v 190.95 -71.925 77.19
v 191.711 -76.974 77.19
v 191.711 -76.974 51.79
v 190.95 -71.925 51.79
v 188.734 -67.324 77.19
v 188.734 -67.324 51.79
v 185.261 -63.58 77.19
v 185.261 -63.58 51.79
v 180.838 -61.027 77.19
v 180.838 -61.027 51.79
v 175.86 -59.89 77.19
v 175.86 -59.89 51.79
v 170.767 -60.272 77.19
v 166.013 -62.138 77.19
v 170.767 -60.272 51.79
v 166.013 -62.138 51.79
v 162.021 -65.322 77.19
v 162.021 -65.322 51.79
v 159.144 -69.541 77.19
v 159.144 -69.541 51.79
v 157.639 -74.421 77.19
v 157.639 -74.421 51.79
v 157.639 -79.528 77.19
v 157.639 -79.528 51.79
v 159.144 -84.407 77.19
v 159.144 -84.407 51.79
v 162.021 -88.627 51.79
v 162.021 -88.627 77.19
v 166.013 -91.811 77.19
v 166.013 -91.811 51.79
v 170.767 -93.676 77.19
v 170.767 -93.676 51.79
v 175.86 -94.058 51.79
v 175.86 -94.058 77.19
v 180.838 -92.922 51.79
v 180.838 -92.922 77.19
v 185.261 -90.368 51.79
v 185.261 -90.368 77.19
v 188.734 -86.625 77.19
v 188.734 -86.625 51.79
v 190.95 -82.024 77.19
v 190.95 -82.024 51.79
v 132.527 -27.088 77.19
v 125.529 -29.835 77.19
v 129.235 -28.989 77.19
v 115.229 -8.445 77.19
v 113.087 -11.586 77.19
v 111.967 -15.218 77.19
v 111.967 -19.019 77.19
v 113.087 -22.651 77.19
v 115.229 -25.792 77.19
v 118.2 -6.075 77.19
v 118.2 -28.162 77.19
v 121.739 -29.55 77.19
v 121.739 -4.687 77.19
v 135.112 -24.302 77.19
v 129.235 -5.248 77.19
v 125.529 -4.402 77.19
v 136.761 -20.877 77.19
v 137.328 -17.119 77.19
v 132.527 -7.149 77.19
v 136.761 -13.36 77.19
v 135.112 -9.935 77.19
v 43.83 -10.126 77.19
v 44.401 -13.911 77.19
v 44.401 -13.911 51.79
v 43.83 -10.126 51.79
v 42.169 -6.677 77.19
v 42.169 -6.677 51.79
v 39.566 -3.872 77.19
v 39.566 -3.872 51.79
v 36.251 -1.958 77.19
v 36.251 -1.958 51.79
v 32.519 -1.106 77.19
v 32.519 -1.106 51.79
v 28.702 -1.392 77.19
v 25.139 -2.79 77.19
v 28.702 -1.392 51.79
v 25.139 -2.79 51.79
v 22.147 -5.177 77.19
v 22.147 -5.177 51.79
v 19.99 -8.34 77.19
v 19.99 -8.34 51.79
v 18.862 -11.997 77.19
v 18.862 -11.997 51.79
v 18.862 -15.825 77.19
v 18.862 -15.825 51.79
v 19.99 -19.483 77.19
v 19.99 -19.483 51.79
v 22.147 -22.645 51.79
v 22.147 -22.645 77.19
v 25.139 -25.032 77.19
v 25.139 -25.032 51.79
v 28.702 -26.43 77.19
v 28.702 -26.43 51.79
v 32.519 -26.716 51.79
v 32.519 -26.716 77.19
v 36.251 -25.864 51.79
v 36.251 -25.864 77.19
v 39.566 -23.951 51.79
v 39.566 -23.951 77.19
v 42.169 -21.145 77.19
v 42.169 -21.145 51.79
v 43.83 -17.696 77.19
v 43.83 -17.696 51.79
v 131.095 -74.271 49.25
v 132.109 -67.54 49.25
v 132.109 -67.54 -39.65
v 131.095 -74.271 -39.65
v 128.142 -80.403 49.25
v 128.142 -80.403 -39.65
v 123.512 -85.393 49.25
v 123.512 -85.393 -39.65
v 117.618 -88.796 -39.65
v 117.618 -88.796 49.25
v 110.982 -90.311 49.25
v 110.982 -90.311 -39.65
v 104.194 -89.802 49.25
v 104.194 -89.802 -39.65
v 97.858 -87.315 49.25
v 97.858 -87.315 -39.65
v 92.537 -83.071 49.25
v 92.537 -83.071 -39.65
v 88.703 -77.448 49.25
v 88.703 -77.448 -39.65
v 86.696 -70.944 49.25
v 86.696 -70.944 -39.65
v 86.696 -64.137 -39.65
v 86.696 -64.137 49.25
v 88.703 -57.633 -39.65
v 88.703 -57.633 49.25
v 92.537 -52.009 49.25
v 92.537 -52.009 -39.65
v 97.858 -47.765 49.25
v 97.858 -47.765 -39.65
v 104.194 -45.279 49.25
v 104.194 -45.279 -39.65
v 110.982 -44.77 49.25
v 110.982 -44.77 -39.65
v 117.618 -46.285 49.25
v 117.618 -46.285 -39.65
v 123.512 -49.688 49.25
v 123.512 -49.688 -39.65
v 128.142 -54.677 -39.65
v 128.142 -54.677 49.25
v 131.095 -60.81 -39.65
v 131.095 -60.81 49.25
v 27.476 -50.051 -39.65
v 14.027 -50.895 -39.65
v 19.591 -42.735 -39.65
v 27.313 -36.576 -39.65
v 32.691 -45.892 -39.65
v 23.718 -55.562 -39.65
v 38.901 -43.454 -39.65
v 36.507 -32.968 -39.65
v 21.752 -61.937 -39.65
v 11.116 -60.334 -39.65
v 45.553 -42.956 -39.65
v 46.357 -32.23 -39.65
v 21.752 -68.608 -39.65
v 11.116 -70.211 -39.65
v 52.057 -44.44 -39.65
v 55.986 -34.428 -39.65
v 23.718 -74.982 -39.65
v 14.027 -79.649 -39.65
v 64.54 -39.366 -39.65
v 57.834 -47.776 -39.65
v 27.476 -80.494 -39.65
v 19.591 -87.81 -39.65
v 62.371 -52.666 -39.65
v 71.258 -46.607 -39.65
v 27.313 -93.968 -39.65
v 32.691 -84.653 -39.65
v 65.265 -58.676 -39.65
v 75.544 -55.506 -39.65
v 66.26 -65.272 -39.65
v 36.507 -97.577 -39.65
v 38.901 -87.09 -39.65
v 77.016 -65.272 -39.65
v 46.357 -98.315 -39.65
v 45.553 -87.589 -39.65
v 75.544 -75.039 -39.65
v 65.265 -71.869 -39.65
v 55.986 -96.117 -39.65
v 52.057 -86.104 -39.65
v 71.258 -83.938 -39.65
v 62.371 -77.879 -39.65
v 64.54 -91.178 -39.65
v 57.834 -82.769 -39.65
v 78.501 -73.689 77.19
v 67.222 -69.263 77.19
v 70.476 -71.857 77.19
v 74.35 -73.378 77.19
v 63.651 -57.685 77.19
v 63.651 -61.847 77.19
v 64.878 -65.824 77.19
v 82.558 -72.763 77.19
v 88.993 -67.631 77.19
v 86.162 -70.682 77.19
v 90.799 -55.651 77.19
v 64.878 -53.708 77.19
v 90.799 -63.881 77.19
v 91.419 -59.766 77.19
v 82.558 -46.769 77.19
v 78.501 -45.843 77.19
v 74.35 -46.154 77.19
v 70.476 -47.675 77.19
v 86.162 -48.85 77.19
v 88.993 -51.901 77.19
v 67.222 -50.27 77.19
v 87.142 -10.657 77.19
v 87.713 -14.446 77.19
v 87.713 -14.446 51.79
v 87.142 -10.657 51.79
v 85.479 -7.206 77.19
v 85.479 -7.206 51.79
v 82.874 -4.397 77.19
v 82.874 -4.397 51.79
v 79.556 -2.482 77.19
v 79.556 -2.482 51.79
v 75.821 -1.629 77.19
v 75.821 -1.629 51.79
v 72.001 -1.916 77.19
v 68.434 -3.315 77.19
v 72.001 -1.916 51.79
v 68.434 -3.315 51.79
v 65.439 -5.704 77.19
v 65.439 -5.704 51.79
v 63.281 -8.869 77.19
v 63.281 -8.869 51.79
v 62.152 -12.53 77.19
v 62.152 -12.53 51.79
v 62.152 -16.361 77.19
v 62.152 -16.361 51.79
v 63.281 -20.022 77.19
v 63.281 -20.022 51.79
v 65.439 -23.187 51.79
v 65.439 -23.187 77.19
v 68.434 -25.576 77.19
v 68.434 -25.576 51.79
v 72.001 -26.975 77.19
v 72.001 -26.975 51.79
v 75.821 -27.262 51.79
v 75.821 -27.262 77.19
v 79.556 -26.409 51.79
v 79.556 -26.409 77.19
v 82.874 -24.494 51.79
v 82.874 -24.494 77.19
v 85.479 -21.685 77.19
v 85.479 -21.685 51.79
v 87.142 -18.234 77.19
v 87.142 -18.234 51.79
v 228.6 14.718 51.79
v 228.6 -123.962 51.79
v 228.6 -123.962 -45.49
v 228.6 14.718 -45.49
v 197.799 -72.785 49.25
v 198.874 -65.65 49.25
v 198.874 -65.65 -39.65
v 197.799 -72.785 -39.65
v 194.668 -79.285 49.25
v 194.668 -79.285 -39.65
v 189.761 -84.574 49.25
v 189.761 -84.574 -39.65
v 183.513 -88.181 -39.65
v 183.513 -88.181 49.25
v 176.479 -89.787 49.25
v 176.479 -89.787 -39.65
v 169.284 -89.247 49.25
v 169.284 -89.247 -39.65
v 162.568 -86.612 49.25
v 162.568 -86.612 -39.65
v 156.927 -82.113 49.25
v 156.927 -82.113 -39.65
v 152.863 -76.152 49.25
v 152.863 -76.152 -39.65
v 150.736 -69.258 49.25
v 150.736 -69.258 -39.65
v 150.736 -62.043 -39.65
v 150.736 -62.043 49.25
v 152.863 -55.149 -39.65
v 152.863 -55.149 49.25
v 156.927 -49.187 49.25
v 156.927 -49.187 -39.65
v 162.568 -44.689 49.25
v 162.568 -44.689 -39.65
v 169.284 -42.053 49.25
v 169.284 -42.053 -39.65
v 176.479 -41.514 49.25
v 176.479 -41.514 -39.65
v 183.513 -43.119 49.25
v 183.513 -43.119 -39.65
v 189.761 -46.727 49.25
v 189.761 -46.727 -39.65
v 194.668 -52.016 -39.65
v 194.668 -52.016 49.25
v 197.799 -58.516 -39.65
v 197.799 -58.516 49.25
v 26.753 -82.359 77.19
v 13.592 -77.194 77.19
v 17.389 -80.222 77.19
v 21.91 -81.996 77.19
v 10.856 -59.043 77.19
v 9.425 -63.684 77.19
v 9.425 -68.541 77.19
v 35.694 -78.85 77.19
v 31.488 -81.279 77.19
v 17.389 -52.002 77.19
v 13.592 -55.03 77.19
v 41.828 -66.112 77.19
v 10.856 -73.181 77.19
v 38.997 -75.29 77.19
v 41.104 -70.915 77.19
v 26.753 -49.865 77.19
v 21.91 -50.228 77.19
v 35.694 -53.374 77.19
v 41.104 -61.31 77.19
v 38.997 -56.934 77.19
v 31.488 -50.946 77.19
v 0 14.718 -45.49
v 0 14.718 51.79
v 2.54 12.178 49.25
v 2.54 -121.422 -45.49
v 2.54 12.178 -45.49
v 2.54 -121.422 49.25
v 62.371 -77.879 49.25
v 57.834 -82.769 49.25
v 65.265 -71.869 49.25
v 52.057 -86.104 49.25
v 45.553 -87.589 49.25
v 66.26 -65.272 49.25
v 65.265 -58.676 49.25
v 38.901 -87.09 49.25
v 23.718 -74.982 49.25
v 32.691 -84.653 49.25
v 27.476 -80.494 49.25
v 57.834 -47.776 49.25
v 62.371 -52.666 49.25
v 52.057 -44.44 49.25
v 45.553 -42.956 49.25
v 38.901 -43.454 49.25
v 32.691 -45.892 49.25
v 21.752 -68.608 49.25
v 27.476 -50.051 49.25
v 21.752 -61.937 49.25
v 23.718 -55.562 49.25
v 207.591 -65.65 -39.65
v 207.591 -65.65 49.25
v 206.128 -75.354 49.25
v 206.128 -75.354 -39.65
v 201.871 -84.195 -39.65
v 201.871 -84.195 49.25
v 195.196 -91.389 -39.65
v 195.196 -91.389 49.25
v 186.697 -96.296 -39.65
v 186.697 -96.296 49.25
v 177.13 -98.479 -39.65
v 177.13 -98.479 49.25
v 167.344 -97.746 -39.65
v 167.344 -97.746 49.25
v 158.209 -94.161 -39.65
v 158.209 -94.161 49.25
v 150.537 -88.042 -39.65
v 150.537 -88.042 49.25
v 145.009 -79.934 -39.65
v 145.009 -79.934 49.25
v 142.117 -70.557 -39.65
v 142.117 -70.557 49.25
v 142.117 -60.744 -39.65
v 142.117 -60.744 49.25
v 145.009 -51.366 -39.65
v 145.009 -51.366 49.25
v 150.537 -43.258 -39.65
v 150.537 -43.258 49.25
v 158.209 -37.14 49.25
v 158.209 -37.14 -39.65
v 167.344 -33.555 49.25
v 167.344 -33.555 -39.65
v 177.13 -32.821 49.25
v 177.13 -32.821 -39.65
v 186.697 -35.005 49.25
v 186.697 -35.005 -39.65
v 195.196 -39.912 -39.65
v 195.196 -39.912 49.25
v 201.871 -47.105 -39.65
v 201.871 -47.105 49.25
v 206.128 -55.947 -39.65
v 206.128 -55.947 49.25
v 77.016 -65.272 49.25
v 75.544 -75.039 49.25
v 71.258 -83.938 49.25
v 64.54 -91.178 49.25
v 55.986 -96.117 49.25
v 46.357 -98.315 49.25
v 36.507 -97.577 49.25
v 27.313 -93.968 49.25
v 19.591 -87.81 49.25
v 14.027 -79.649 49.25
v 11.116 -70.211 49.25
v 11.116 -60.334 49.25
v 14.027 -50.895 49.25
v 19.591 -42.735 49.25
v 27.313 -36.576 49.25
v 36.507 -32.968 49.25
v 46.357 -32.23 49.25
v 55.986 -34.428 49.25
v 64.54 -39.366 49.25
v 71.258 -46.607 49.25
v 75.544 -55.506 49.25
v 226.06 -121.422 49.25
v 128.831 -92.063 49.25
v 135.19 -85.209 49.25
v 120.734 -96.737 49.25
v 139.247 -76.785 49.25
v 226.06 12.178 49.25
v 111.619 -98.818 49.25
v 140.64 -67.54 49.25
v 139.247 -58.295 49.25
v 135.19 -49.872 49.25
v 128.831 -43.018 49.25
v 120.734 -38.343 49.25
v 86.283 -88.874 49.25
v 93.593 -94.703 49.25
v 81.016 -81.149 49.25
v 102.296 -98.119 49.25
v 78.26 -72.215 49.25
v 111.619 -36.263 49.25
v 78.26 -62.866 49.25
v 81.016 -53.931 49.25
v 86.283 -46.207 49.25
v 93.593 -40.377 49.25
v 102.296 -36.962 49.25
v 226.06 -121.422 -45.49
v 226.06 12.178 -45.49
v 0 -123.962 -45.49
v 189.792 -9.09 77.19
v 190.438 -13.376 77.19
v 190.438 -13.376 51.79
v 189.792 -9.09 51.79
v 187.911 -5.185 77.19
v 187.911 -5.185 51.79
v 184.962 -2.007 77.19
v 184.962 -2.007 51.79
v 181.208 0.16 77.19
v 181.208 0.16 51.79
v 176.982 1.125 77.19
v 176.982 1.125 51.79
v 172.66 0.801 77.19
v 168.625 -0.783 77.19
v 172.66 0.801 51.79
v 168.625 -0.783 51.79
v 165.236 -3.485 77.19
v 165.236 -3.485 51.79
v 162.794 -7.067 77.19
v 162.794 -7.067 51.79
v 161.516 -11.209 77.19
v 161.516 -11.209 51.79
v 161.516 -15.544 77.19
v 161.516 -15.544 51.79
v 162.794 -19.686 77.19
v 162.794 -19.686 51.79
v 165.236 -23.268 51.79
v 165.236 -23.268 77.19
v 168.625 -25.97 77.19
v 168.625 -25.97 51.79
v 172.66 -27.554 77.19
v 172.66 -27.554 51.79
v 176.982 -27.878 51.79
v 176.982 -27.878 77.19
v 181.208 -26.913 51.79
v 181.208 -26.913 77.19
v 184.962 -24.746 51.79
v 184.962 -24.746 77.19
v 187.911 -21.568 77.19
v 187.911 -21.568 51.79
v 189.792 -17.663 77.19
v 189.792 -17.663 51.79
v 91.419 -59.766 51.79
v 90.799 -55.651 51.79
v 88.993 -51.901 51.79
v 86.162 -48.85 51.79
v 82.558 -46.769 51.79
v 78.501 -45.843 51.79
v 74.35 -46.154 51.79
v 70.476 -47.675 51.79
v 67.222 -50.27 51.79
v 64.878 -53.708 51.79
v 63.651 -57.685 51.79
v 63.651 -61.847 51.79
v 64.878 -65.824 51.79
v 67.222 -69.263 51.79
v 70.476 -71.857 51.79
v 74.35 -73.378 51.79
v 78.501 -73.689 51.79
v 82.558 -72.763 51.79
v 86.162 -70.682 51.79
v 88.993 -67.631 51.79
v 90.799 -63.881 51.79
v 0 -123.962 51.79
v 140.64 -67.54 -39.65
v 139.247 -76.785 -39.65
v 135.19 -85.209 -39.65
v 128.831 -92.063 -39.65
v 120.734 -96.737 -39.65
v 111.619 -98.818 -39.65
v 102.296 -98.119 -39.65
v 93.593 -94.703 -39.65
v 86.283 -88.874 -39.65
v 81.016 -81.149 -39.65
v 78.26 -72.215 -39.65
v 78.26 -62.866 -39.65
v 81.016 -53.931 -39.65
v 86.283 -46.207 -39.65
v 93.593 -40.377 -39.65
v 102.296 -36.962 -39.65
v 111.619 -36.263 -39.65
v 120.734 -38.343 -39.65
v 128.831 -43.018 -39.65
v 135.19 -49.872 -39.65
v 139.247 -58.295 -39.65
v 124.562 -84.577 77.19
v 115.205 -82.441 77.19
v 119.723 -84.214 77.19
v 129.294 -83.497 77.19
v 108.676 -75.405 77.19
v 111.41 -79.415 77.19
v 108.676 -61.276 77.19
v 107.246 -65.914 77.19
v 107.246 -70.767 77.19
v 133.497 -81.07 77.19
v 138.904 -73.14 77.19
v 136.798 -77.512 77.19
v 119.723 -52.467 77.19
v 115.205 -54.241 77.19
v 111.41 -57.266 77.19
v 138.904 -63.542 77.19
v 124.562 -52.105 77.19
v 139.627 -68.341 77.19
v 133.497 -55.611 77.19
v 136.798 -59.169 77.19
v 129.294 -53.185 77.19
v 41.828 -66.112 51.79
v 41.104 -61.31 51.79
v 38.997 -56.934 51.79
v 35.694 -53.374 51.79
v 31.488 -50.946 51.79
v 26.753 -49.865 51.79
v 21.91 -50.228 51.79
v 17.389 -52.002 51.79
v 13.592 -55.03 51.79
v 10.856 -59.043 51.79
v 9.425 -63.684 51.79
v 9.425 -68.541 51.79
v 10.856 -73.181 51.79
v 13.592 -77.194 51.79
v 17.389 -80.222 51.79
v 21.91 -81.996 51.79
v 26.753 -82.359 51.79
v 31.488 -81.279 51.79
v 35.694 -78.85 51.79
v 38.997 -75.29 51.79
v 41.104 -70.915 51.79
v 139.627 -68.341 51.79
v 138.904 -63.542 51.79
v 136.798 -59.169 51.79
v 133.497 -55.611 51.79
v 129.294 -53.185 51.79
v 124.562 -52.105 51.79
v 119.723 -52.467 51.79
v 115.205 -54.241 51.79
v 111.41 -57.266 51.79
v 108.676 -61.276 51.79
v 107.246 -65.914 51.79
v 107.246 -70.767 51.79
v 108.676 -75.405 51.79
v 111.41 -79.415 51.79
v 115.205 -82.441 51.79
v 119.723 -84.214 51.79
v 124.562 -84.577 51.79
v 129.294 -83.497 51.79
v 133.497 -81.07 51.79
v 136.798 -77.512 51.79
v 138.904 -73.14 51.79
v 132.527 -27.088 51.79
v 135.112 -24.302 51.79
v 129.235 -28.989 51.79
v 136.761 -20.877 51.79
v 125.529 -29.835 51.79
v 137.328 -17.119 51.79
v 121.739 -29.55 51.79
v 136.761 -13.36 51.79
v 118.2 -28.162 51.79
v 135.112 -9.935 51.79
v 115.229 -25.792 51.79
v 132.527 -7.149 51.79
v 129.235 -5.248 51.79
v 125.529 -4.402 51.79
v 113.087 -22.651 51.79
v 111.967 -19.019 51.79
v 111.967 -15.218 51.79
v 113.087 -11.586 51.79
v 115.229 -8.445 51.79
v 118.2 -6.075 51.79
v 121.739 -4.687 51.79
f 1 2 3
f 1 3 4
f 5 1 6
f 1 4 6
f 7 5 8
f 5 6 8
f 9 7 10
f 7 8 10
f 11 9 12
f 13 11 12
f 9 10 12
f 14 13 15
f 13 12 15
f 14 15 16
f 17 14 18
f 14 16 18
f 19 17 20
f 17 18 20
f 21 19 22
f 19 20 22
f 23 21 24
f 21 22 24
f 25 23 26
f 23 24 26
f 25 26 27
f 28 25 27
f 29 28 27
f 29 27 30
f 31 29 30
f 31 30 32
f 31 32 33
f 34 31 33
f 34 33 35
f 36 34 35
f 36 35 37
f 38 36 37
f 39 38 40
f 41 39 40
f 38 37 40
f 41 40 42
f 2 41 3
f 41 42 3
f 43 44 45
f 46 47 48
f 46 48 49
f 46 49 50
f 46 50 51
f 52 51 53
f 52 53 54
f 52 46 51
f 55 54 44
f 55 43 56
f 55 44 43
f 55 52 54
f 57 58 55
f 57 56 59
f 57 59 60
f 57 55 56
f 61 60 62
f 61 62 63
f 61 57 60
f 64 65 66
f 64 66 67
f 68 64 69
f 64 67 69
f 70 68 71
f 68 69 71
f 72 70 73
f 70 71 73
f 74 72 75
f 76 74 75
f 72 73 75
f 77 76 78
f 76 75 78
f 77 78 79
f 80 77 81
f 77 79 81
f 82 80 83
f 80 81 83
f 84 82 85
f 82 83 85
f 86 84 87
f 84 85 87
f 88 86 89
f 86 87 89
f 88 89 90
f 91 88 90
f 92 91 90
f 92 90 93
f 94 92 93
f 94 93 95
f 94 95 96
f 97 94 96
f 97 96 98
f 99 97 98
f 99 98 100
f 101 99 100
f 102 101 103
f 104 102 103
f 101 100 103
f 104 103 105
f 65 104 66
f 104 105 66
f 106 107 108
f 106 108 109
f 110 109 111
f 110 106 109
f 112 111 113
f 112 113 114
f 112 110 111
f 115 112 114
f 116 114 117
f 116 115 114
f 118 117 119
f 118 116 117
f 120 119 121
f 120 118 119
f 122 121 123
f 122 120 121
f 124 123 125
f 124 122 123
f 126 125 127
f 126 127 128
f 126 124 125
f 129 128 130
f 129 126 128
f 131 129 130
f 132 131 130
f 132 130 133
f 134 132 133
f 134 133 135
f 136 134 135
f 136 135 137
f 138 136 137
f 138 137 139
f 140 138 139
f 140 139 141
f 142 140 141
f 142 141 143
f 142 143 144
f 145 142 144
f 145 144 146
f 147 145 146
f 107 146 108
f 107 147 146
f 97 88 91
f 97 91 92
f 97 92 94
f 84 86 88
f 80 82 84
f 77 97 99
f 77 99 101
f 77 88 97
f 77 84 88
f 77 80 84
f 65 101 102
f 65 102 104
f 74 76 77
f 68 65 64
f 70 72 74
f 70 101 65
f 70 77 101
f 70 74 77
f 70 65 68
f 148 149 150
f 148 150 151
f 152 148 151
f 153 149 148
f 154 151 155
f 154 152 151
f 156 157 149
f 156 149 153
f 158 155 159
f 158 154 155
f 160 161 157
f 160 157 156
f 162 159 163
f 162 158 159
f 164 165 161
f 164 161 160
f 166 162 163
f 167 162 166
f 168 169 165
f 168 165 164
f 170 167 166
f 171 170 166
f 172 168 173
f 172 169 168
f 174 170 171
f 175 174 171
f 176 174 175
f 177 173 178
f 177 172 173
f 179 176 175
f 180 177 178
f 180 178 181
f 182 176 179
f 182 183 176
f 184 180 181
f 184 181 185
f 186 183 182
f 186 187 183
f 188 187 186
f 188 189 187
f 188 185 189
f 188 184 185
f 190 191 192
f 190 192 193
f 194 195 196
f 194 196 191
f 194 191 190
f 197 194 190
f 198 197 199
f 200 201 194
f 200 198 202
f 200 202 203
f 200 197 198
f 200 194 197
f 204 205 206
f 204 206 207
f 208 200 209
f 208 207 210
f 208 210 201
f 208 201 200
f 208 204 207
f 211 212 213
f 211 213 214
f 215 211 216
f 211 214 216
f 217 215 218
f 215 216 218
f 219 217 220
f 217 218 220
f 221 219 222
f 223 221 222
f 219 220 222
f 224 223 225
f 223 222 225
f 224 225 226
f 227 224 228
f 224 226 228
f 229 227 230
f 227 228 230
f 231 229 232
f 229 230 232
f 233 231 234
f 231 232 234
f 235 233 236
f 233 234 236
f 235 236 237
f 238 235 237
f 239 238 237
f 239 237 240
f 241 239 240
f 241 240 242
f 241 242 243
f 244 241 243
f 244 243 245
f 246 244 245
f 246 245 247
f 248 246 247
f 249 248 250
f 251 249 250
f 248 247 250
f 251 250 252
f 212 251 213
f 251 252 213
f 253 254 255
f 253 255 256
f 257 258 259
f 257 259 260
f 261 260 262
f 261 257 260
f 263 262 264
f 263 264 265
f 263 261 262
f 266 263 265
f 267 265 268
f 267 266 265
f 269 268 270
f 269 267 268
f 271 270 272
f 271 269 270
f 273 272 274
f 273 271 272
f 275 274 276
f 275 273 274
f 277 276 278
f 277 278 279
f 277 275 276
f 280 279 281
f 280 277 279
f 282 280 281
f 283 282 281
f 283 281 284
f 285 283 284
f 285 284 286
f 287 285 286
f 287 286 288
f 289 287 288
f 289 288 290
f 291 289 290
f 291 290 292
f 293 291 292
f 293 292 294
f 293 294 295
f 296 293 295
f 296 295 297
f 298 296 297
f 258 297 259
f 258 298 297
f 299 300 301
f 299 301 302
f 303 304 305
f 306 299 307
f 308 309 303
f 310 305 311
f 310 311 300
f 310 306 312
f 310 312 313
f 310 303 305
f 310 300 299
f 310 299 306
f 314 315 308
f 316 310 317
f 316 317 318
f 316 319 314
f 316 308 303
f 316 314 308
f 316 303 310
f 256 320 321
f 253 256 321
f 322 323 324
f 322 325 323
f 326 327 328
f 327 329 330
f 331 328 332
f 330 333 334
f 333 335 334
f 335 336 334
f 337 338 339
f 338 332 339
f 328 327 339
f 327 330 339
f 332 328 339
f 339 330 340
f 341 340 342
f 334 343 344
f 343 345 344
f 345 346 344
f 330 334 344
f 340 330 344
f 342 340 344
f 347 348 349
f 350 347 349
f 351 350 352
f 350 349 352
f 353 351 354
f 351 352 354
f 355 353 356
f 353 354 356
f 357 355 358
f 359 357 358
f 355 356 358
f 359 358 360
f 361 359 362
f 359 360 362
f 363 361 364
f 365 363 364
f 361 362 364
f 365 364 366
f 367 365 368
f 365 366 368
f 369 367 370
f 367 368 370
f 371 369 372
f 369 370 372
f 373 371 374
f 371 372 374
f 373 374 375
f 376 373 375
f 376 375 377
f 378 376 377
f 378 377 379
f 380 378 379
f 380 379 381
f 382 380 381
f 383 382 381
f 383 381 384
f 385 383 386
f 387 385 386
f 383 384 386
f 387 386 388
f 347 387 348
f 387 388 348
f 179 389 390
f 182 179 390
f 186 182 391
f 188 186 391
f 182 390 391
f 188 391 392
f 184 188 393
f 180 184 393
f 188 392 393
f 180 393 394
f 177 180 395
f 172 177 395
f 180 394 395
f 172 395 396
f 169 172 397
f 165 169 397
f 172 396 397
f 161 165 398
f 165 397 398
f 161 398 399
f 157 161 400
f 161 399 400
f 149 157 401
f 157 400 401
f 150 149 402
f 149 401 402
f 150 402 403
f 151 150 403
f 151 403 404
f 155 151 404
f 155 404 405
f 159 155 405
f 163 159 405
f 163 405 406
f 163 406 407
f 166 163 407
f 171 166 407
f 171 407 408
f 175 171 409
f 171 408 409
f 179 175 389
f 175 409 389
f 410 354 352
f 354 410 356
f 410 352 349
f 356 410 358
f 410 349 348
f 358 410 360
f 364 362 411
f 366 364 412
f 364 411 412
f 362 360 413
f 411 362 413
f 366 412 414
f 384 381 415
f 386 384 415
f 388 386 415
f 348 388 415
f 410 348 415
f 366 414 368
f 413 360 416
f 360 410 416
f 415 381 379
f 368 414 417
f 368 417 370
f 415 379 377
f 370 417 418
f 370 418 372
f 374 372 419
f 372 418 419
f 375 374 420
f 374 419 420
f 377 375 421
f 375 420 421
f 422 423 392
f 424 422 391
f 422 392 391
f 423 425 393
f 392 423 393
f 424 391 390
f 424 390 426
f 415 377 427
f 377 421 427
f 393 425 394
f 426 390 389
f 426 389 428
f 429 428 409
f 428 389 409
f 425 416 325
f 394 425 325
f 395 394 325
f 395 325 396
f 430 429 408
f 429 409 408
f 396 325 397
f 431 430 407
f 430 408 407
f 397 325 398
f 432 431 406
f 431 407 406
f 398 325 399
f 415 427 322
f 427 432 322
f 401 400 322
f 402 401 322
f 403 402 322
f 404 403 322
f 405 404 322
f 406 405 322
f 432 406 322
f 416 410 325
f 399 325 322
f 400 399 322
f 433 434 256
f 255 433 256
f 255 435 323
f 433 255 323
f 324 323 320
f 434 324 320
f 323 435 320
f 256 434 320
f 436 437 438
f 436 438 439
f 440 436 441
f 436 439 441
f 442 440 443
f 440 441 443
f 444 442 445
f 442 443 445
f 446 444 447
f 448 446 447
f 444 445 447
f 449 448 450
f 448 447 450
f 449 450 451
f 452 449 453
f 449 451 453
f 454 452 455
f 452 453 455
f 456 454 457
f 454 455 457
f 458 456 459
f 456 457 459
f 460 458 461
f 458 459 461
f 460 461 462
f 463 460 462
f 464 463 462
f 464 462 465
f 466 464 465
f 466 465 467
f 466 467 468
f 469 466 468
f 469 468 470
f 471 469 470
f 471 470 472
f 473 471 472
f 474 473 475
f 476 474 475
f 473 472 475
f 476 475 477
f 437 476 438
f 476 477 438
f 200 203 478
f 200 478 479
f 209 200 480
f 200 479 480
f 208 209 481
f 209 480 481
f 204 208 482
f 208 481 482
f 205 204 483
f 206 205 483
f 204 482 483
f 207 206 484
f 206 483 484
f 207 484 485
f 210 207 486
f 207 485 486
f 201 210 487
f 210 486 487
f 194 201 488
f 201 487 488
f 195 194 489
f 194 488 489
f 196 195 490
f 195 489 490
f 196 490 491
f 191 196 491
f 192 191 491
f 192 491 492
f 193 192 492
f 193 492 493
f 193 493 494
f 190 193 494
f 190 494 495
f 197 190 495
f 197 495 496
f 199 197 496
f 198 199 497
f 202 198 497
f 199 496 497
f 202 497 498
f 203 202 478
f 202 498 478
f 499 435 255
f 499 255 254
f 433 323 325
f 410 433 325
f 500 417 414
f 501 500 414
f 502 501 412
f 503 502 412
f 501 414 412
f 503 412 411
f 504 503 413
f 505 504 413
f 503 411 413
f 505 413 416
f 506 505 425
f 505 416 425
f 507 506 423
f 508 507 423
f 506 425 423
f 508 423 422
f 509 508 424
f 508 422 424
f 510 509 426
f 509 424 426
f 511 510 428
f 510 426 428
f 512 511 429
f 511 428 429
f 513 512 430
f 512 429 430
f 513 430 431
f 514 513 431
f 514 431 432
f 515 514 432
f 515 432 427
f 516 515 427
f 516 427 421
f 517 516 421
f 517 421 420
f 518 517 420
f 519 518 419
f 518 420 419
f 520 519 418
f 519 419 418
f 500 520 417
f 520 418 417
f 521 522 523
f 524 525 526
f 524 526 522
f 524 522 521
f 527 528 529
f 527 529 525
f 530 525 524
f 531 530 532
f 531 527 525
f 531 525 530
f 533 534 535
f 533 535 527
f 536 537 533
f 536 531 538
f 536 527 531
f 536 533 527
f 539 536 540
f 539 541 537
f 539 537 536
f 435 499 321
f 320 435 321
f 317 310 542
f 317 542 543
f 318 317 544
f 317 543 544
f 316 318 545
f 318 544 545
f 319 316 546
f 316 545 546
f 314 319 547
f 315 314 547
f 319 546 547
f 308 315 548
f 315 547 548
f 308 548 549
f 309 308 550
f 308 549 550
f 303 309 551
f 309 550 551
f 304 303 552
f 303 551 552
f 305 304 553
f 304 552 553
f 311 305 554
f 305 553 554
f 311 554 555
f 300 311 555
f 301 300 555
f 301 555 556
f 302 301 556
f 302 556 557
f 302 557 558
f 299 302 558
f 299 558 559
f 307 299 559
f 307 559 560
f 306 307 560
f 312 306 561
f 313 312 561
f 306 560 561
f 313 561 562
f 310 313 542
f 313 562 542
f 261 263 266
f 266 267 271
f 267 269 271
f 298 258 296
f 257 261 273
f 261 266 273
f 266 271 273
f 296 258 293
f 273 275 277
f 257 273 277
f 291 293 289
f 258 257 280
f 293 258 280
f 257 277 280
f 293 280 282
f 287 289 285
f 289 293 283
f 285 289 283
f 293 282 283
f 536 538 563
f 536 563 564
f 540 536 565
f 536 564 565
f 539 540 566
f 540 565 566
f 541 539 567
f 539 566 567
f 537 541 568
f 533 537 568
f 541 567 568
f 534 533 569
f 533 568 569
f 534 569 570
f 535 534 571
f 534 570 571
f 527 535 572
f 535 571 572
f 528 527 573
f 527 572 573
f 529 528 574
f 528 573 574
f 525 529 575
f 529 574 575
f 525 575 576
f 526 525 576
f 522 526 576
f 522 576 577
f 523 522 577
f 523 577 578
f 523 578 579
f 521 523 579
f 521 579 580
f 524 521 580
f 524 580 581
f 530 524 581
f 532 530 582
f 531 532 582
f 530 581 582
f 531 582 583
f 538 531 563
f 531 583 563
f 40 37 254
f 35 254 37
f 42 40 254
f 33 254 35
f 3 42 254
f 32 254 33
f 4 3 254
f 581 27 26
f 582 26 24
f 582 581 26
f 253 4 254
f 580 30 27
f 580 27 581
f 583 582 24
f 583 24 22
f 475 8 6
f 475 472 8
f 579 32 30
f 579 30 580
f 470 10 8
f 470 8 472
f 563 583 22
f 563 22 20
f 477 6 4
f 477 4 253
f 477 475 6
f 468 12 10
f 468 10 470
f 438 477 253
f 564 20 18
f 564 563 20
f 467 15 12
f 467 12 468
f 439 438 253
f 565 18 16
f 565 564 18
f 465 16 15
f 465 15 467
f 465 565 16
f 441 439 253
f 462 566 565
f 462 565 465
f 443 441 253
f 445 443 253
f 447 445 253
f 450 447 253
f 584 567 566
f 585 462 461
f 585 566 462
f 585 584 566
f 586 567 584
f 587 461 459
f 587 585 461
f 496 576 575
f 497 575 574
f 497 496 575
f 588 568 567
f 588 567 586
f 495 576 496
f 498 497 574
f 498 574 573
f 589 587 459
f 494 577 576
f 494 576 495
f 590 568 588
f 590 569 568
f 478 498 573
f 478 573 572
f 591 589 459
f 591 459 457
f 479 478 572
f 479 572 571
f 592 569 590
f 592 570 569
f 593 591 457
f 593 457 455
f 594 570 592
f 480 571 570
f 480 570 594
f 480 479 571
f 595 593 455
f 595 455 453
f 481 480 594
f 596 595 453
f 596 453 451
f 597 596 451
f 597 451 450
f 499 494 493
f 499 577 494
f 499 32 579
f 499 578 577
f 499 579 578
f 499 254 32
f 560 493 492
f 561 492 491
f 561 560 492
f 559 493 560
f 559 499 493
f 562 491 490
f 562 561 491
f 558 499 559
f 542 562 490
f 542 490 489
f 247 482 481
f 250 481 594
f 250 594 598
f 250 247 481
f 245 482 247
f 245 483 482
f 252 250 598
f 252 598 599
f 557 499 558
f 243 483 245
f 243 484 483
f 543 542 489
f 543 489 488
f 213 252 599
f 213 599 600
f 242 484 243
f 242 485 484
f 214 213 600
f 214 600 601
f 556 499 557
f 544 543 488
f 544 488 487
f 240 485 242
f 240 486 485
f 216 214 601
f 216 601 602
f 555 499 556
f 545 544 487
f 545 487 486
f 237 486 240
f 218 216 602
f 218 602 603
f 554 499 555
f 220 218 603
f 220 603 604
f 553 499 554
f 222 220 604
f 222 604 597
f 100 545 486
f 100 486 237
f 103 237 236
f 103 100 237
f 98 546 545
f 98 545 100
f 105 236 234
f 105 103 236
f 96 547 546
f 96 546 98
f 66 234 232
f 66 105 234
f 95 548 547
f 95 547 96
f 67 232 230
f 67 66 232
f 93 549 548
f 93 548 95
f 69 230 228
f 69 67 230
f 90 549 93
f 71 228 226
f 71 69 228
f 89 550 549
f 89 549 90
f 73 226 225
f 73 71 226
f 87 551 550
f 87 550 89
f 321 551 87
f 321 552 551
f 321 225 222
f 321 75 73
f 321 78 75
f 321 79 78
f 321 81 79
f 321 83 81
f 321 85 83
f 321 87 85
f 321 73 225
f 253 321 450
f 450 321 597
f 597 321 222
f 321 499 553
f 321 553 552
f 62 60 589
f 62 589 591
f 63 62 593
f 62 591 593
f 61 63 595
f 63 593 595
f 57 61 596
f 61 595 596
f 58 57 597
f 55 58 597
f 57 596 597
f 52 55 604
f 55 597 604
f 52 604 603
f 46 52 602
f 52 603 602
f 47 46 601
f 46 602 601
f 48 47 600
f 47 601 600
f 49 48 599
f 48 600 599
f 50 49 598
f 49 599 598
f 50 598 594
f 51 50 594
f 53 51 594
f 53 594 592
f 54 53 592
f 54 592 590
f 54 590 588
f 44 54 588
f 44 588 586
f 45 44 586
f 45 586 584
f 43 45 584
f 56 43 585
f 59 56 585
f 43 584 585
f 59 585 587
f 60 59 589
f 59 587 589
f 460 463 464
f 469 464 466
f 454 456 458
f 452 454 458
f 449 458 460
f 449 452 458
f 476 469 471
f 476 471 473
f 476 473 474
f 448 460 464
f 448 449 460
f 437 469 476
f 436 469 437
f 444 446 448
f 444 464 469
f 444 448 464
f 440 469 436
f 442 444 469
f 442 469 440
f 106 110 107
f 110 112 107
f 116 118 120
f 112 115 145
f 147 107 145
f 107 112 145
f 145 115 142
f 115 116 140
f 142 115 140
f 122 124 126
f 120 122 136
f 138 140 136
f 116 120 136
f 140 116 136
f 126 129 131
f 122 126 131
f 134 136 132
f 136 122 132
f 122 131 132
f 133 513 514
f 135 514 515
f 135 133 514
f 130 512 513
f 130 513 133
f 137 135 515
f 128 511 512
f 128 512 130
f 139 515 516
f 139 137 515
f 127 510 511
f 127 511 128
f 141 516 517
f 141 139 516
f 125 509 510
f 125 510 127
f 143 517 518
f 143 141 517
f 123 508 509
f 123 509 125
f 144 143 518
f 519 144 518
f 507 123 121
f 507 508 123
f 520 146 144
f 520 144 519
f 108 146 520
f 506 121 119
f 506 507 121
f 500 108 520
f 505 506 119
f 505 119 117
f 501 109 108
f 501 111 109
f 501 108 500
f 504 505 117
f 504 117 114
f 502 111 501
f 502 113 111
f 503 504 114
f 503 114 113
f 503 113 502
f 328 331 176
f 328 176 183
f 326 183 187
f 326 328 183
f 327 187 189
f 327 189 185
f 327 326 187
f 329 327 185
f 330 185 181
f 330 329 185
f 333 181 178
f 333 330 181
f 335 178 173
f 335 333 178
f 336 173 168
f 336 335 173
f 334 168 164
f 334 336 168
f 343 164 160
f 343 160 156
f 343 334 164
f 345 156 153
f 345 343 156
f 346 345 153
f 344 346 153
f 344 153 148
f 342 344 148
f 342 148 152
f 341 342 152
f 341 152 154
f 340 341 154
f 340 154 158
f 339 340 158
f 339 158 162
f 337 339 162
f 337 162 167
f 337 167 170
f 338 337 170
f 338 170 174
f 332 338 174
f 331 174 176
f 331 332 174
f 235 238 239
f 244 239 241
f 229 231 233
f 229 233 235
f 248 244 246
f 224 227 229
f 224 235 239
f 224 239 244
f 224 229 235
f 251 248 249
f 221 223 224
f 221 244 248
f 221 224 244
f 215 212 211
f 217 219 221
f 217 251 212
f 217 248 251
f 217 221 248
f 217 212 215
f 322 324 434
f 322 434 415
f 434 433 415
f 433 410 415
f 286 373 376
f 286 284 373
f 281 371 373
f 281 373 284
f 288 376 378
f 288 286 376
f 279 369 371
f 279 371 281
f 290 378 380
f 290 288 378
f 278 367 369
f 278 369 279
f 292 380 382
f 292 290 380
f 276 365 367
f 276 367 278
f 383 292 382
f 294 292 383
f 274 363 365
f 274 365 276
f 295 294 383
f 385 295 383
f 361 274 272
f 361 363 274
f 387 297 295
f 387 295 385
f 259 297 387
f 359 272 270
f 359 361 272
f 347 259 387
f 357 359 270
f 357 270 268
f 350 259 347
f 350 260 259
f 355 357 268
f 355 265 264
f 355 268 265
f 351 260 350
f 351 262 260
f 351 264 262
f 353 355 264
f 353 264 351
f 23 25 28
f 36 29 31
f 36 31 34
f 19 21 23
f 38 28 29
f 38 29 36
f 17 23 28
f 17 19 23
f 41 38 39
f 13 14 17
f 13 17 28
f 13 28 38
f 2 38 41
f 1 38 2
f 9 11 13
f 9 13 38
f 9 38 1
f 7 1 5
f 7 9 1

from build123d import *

# Parameters (mm, degrees)
F0_W      = 138.6799942702
F0_H      = 97.2796790302
F1_DEPTH  = 228.6
F2_T      = -2.54
F3_R      = 33.1351902141
F3_R_2    = 22.3789539676
F4_DEPTH  = 88.9
F5_R      = 31.365179226
F5_R_2    = 22.8340375073
F6_DEPTH  = 88.9
F7_R      = 32.921040163
F7_R_2    = 24.2040309483
F8_DEPTH  = 88.9
F9_R      = 12.840995734
F9_R_2    = 12.8521164222
F9_R_3    = 12.7516607916
F9_R_4    = 14.5420806557
F9_R_5    = 17.1317992696
F9_R_6    = 16.2815585051
F9_R_7    = 13.9618543487
F9_R_8    = 16.2927152835
F10_DEPTH = 25.4


with BuildPart() as f1:
    # F0 (on Right) → F1 (new body)
    with BuildSketch(Plane.YZ):
        with Locations((-54.6218389645, 3.1497571617)):
            Rectangle(F0_W, F0_H)
    extrude(amount=F1_DEPTH)

    # F2
    f2_openings = [f1.faces().sort_by_distance(p)[0] for p in [
        (114.3, -54.621839, -45.490082),
    ]]
    offset(amount=F2_T, openings=f2_openings)

    # F3 (on face) → F4 (join)
    with BuildSketch(Plane(origin=(0, 0, 49.2495966768), x_dir=(1, 0, 0), z_dir=(0, 0, -1))):
        with Locations((43.8807010651, 65.2723014355)):
            Circle(F3_R)
        with Locations((43.8807010651, 65.2723014355)):
            Circle(F3_R_2, mode=Mode.SUBTRACT)
    extrude(amount=F4_DEPTH)

    # F5 (on face) → F6 (join)
    with BuildSketch(Plane(origin=(0, 0, 49.2495966768), x_dir=(1, 0, 0), z_dir=(0, 0, -1))):
        with Locations((109.2752963305, 67.5403177738)):
            Circle(F5_R)
        with Locations((109.2752963305, 67.5403177738)):
            Circle(F5_R_2, mode=Mode.SUBTRACT)
    extrude(amount=F6_DEPTH)

    # F7 (on face) → F8 (join)
    with BuildSketch(Plane(origin=(0, 0, 49.2495966768), x_dir=(1, 0, 0), z_dir=(0, 0, -1))):
        with Locations((174.669906497, 65.6502991915)):
            Circle(F7_R)
        with Locations((174.669906497, 65.6502991915)):
            Circle(F7_R_2, mode=Mode.SUBTRACT)
    extrude(amount=F8_DEPTH)

    # F9 (on face) → F10 (join)
    with BuildSketch(Plane.XY.offset(51.7895966768)):
        with Locations((31.5596684813, -13.9110339805)):
            Circle(F9_R)
        with Locations((74.8604610562, -14.4456122071)):
            Circle(F9_R_2)
        with Locations((124.5761811733, -17.1185005456)):
            Circle(F9_R_3)
        with Locations((175.8956313133, -13.3764576167)):
            Circle(F9_R_4)
        with Locations((174.5792776346, -76.9741907716)):
            Circle(F9_R_5)
        with Locations((123.3455315232, -68.3407709002)):
            Circle(F9_R_6)
        with Locations((77.4572491646, -59.7661323845)):
            Circle(F9_R_7)
        with Locations((25.5353599787, -66.1121979356)):
            Circle(F9_R_8)
    extrude(amount=F10_DEPTH)


solid = f1.part
